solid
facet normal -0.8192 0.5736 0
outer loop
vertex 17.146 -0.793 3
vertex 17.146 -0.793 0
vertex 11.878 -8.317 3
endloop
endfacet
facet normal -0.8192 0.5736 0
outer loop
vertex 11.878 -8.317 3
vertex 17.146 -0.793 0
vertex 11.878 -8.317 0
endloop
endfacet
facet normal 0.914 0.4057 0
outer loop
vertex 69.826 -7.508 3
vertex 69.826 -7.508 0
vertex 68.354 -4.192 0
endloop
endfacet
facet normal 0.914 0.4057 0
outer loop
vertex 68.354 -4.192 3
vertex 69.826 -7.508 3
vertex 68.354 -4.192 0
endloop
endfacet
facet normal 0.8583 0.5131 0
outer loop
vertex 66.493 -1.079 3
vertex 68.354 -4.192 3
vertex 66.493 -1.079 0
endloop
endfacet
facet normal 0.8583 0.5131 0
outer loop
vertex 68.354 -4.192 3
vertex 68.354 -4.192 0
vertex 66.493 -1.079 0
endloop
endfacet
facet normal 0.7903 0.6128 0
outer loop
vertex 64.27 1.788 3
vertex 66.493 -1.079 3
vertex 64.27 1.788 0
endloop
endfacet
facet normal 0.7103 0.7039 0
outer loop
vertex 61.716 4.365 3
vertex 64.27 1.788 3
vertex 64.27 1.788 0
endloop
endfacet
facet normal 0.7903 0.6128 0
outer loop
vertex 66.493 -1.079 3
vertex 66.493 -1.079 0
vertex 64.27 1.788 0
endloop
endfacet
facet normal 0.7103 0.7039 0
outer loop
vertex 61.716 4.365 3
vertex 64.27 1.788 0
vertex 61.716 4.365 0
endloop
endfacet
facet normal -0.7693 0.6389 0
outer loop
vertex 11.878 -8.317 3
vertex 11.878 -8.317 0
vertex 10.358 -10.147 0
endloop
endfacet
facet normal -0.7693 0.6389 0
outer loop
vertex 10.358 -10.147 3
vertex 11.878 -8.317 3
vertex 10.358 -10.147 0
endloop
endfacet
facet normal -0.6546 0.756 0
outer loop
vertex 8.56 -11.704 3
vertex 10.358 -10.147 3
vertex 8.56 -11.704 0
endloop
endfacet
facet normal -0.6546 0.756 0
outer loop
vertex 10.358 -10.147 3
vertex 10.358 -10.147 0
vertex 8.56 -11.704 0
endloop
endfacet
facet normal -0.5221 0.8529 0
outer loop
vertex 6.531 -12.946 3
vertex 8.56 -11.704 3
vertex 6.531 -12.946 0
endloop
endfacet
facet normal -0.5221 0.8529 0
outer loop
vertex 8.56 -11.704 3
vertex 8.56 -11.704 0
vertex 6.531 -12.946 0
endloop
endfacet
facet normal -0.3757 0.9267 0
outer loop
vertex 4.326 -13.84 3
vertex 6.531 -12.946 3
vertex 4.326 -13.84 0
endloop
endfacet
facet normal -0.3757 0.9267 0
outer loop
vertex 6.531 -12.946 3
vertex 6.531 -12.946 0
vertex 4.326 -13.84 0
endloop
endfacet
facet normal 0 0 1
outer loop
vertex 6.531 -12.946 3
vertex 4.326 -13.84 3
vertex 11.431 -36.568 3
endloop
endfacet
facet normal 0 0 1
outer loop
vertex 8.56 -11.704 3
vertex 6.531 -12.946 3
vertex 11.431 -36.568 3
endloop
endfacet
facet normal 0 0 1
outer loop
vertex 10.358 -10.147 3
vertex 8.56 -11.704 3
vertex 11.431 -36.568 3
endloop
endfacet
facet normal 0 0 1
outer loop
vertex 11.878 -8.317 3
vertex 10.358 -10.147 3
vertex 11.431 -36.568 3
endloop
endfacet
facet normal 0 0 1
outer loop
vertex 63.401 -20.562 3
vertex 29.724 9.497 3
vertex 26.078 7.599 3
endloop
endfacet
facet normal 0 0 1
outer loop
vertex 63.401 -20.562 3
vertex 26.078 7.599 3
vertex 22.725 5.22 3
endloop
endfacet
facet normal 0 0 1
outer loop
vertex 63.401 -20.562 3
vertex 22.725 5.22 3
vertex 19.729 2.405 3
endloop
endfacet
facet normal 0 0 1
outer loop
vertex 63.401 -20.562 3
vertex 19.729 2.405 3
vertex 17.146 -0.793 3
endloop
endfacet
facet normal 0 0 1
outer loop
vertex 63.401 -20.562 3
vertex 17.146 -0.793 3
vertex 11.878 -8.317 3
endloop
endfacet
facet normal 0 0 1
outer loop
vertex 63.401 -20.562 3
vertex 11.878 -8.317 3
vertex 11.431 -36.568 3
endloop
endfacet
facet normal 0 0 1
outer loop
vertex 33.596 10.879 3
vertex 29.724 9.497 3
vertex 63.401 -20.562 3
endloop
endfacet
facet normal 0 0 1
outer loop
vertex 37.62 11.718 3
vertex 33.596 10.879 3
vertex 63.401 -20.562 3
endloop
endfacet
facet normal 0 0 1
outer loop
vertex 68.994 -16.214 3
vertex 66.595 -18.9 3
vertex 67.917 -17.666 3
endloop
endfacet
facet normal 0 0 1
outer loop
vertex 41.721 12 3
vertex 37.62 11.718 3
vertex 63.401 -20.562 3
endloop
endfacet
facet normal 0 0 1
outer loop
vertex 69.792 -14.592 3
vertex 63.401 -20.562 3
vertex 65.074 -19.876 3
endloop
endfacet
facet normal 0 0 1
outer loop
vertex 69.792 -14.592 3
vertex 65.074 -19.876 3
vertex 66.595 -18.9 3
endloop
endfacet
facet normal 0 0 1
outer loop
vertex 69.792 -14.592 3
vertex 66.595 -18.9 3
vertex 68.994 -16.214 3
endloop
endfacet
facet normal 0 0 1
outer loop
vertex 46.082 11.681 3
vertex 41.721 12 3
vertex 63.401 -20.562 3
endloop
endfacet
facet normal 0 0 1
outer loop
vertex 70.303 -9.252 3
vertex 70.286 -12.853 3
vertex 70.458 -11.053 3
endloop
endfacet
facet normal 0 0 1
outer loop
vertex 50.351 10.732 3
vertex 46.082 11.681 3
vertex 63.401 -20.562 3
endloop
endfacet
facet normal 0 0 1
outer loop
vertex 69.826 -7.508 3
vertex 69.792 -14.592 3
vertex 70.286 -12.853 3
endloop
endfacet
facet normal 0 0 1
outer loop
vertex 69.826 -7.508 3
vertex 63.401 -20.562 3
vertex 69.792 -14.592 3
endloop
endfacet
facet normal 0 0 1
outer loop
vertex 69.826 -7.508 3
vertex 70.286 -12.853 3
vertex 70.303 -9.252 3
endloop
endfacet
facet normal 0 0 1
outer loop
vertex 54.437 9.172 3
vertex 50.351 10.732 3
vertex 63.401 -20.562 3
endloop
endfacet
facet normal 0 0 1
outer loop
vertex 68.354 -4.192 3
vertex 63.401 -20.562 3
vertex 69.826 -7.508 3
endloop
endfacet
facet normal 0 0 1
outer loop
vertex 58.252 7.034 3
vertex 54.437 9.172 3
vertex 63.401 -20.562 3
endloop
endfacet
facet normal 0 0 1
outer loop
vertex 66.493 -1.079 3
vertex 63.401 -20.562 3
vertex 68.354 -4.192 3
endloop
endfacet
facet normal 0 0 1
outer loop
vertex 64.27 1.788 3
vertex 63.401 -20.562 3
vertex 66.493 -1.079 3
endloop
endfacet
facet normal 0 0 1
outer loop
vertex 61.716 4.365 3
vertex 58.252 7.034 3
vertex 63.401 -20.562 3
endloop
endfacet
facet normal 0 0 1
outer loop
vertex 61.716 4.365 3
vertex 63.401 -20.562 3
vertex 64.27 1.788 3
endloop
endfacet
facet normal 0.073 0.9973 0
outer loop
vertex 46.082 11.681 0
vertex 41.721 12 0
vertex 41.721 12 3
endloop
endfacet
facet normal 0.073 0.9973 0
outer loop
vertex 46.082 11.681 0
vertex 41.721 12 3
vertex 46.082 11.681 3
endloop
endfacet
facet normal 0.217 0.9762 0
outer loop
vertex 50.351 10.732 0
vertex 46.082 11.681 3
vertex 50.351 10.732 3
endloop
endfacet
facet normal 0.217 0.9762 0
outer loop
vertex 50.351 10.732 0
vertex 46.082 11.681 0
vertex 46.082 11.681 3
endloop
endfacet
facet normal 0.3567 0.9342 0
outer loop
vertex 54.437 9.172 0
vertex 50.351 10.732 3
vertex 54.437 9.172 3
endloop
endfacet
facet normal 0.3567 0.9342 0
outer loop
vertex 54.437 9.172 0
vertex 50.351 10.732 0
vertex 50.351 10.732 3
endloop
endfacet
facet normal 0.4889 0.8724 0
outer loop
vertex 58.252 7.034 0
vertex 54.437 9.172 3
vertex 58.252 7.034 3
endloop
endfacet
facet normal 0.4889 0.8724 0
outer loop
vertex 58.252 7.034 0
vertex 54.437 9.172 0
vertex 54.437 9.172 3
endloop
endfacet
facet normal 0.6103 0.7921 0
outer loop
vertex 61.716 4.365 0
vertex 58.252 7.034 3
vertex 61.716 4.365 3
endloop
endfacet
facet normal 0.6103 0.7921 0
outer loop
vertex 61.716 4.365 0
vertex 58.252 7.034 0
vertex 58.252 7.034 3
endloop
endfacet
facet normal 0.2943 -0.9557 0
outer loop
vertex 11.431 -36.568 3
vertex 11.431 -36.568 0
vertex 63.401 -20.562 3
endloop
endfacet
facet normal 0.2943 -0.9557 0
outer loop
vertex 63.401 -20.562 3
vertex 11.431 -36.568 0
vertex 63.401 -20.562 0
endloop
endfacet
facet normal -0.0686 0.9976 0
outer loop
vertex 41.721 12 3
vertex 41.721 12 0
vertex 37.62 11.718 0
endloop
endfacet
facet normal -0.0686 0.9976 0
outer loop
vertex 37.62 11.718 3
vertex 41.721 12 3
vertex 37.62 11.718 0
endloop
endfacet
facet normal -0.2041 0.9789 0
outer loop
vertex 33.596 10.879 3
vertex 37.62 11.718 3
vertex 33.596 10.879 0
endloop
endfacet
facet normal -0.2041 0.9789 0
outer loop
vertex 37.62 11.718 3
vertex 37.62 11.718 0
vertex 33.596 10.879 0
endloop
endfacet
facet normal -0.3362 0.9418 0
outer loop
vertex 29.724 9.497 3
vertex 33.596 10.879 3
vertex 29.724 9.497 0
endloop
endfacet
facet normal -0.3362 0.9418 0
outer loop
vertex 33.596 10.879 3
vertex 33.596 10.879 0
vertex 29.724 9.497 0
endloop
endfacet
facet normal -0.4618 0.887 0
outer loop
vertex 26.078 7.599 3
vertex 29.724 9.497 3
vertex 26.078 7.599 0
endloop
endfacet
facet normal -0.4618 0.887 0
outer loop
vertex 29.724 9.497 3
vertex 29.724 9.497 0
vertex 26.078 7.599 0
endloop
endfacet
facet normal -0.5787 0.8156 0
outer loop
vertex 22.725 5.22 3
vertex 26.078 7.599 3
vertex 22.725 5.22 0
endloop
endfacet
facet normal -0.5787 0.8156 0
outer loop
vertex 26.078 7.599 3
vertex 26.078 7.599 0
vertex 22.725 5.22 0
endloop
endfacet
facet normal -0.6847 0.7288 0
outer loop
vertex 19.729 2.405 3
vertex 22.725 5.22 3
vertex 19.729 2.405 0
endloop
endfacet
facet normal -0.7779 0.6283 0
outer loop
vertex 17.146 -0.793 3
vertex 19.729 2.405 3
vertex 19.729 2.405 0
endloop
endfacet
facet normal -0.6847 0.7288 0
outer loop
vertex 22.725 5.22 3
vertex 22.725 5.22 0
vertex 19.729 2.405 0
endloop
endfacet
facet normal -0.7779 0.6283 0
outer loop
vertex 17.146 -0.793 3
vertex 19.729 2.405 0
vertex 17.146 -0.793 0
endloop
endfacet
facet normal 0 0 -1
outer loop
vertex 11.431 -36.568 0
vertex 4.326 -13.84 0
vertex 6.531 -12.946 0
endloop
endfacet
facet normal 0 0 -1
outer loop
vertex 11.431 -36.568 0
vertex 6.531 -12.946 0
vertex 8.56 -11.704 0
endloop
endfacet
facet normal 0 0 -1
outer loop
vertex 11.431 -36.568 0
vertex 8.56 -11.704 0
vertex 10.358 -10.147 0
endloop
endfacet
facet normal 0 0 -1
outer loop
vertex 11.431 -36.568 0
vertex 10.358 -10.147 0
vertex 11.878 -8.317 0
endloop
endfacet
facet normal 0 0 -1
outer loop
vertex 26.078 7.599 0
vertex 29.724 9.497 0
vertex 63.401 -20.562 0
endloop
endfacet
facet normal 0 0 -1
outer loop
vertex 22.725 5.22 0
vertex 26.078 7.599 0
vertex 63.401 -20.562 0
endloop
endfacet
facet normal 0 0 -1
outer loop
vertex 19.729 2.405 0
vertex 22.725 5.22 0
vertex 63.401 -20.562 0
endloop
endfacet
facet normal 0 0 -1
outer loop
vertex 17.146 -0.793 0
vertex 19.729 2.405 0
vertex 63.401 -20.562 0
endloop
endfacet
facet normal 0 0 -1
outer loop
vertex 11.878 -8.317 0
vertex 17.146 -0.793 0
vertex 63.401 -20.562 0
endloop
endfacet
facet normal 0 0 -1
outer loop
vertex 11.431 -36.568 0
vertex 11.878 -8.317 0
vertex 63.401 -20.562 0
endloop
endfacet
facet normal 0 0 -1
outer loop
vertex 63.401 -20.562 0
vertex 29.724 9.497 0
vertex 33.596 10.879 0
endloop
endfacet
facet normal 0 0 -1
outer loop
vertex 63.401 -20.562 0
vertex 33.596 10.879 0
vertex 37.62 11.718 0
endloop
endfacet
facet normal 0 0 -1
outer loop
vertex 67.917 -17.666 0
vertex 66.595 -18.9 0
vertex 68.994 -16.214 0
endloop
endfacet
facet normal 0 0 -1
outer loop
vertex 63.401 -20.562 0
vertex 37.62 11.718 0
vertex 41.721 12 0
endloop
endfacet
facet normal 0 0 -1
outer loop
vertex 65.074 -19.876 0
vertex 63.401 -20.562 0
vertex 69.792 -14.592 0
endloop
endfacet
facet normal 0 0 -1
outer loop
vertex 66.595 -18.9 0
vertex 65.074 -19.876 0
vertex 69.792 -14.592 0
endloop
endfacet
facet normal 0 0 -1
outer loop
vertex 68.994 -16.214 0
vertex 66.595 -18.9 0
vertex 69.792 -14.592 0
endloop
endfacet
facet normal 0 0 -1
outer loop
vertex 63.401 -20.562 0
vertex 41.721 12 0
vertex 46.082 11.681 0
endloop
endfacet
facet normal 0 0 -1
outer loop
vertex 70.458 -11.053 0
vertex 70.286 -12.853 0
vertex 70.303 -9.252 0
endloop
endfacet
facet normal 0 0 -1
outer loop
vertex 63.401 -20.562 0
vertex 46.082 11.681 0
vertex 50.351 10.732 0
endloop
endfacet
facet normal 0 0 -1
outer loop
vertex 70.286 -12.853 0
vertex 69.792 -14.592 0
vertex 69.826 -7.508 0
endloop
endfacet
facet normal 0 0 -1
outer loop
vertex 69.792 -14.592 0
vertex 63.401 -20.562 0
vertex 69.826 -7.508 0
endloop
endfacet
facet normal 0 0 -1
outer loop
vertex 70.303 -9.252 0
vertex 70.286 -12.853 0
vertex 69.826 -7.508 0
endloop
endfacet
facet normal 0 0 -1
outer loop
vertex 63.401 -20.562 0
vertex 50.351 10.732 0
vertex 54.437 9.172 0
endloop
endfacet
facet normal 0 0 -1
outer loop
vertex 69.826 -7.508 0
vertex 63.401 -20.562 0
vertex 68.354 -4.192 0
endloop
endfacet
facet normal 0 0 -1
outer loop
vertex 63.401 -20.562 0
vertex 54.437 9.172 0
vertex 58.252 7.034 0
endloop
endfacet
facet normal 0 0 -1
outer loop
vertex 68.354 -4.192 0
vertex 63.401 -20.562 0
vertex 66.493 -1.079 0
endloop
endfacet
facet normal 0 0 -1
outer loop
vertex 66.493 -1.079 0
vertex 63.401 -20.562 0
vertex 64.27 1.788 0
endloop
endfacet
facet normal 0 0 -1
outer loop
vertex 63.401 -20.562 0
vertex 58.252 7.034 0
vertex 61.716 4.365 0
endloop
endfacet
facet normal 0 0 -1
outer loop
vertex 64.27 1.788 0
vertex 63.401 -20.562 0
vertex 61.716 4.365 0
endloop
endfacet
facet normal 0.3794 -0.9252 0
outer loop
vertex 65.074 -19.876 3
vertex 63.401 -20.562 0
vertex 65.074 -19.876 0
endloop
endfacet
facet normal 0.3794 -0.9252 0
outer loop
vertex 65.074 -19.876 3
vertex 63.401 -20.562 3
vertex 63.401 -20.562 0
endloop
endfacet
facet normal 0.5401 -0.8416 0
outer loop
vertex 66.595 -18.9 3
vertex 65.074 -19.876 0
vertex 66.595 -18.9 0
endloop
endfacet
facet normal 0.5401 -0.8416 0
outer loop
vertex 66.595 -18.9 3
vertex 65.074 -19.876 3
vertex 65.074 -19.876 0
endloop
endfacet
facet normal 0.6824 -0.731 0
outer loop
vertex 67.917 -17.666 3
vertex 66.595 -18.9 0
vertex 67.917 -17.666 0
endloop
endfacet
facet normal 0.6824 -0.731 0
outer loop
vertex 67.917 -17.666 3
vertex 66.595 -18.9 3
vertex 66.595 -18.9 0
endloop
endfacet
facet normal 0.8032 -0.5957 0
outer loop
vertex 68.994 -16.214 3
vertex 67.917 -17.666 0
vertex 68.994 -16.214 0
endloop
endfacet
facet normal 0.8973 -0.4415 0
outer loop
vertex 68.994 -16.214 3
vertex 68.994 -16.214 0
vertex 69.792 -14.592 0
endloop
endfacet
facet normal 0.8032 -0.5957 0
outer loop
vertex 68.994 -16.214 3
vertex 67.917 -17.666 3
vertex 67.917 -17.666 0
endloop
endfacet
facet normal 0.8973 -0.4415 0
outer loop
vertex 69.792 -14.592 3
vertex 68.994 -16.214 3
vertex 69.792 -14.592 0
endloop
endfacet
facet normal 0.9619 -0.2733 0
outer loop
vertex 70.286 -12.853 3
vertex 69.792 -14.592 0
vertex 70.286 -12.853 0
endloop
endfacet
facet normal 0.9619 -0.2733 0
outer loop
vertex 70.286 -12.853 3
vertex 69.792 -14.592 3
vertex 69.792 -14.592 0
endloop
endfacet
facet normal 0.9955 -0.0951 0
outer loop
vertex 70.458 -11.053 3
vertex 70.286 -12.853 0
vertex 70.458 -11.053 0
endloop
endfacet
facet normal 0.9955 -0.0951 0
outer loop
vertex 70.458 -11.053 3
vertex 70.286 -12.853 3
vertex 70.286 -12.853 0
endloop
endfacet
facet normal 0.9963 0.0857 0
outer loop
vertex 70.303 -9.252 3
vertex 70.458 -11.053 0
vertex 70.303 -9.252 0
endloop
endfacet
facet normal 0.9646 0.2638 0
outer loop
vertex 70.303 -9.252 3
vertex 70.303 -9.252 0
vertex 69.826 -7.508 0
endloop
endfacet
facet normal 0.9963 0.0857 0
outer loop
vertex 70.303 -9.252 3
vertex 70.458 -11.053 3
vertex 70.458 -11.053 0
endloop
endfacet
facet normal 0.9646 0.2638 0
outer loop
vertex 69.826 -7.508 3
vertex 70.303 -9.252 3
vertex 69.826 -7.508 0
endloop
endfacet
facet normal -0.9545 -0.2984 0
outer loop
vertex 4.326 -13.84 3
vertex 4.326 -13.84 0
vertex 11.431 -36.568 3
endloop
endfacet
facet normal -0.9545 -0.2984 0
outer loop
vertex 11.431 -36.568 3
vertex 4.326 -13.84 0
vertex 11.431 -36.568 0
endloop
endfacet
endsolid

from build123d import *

# Parameters (mm, degrees)
BOSS_EXTRUDE1_START     = -3
BOSS_EXTRUDE1_OUTLINE_R = 2.5
BOSS_EXTRUDE1_DEPTH     = 3
FILLET1_R               = 10
BOSS_EXTRUDE2_START     = -3
BOSS_EXTRUDE2_DEPTH     = 3
CUT_EXTRUDE1_START      = -3
CUT_EXTRUDE1_DEPTH      = 3
FILLET2_R               = 10
CUT_EXTRUDE2_DEPTH      = 103.947966144
CUT_EXTRUDE2_DEPTH_BACK = 103.947966144


with BuildPart() as part:
    # Boss-Extrude1: read off the stored shape, not the designer's step
    # Boss-Extrude1 outline → Boss-Extrude1 (new body)
    with BuildSketch(Plane.XY.offset(3).offset(BOSS_EXTRUDE1_START)):
        with BuildLine():
            ThreePointArc((-24.364065342, 16.876742294), (-25.101814907, 17.696096192), (-26.161653435, 18))
            Line((-26.161653435, 18), (-27.830556346, 18))
            ThreePointArc((-27.830556346, 18), (-29.526652538, 17.059838528), (-29.628144438, 15.123257706))
            Line((-29.628144438, 15.123257706), (-16.550964109, -11.68893536))
            ThreePointArc((-16.550964109, -11.68893536), (-15.603505287, -14.937815984), (-15.793938159, -18.316667689))
            Line((-15.793938159, -18.316667689), (-24.617449619, -56.633968709))
            ThreePointArc((-24.617449619, -56.633968709), (-12.550978841, -74.781492041), (4.900124379, -61.728089553))
            Line((4.900124379, -61.728089553), (7.520756747, -39.132184047))
            Line((7.520756747, -39.132184047), (57.484416951, -6.361887987))
            ThreePointArc((57.484416951, -6.361887987), (61.581724267, 4.861915454), (52, 12))
            Line((52, 12), (41.720733512, 12))
            ThreePointArc((41.720733512, 12), (27.868275115, 8.610324995), (17.146172183, -0.792706909))
            Line((17.146172183, -0.792706909), (11.877704642, -8.316858327))
            ThreePointArc((11.877704642, -8.316858327), (-1.137656888, -14.455301339), (-13.032513671, -6.356381628))
            Line((-13.032513671, -6.356381628), (-24.364065342, 16.876742294))
        make_face()
        with Locations((-10, -60)):
            Circle(BOSS_EXTRUDE1_OUTLINE_R, mode=Mode.SUBTRACT)
    extrude(amount=BOSS_EXTRUDE1_DEPTH)

    # Fillet1
    fillet1_edges = [part.edges().sort_by_distance(p)[0] for p in [
        (7.520756747, -39.132184047, 1.5),
    ]]
    fillet(fillet1_edges, radius=FILLET1_R)

    # Sketch2 → Boss-Extrude2 (add)
    with BuildSketch(Plane.XY.offset(3).offset(BOSS_EXTRUDE2_START)):
        with BuildLine():
            Line((11.431019345, -36.567510792), (71.720733512, -18))
            ThreePointArc((71.720733512, -18), (69.105682696, -5.749915992), (61.716429632, 4.364528537))
            ThreePointArc((61.716429632, 4.364528537), (61.302173782, -1.670090316), (57.484416951, -6.361887987))
            Line((57.484416951, -6.361887987), (11.431019345, -36.567510792))
        make_face()
    extrude(amount=BOSS_EXTRUDE2_DEPTH)

    # Sketch2<4> → Cut-Extrude1 (cut)
    with BuildSketch(Plane.XY.offset(3).offset(CUT_EXTRUDE1_START)):
        with BuildLine():
            ThreePointArc((41.720733512, 12), (52.42269931, 10.026200742), (61.716429632, 4.364528537))
            ThreePointArc((61.716429632, 4.364528537), (58.178782835, 9.862737607), (52, 12))
            Line((52, 12), (41.720733512, 12))
        make_face()
    extrude(amount=CUT_EXTRUDE1_DEPTH, mode=Mode.SUBTRACT)

    # Fillet2
    fillet2_edges = [part.edges().sort_by_distance(p)[0] for p in [
        (71.720733512, -18, 1.5),
    ]]
    fillet(fillet2_edges, radius=FILLET2_R)

    # Sketch3 → Cut-Extrude2 (cut, two sides: drawn at the far end of the back side and taken through both)
    with BuildSketch(Plane.XY.offset(3).offset(-CUT_EXTRUDE2_DEPTH_BACK)):
        Polygon((-108.405592733, 346.786455555), (-15.36308768, 49.146087288), (29.942477709, -95.785147736), (122.984982762, -393.425516003), (-472.295753771, -579.510526109), (-703.686329267, 160.701445449), align=None)
    extrude(amount=CUT_EXTRUDE2_DEPTH + CUT_EXTRUDE2_DEPTH_BACK, mode=Mode.SUBTRACT)


solid = part.part
